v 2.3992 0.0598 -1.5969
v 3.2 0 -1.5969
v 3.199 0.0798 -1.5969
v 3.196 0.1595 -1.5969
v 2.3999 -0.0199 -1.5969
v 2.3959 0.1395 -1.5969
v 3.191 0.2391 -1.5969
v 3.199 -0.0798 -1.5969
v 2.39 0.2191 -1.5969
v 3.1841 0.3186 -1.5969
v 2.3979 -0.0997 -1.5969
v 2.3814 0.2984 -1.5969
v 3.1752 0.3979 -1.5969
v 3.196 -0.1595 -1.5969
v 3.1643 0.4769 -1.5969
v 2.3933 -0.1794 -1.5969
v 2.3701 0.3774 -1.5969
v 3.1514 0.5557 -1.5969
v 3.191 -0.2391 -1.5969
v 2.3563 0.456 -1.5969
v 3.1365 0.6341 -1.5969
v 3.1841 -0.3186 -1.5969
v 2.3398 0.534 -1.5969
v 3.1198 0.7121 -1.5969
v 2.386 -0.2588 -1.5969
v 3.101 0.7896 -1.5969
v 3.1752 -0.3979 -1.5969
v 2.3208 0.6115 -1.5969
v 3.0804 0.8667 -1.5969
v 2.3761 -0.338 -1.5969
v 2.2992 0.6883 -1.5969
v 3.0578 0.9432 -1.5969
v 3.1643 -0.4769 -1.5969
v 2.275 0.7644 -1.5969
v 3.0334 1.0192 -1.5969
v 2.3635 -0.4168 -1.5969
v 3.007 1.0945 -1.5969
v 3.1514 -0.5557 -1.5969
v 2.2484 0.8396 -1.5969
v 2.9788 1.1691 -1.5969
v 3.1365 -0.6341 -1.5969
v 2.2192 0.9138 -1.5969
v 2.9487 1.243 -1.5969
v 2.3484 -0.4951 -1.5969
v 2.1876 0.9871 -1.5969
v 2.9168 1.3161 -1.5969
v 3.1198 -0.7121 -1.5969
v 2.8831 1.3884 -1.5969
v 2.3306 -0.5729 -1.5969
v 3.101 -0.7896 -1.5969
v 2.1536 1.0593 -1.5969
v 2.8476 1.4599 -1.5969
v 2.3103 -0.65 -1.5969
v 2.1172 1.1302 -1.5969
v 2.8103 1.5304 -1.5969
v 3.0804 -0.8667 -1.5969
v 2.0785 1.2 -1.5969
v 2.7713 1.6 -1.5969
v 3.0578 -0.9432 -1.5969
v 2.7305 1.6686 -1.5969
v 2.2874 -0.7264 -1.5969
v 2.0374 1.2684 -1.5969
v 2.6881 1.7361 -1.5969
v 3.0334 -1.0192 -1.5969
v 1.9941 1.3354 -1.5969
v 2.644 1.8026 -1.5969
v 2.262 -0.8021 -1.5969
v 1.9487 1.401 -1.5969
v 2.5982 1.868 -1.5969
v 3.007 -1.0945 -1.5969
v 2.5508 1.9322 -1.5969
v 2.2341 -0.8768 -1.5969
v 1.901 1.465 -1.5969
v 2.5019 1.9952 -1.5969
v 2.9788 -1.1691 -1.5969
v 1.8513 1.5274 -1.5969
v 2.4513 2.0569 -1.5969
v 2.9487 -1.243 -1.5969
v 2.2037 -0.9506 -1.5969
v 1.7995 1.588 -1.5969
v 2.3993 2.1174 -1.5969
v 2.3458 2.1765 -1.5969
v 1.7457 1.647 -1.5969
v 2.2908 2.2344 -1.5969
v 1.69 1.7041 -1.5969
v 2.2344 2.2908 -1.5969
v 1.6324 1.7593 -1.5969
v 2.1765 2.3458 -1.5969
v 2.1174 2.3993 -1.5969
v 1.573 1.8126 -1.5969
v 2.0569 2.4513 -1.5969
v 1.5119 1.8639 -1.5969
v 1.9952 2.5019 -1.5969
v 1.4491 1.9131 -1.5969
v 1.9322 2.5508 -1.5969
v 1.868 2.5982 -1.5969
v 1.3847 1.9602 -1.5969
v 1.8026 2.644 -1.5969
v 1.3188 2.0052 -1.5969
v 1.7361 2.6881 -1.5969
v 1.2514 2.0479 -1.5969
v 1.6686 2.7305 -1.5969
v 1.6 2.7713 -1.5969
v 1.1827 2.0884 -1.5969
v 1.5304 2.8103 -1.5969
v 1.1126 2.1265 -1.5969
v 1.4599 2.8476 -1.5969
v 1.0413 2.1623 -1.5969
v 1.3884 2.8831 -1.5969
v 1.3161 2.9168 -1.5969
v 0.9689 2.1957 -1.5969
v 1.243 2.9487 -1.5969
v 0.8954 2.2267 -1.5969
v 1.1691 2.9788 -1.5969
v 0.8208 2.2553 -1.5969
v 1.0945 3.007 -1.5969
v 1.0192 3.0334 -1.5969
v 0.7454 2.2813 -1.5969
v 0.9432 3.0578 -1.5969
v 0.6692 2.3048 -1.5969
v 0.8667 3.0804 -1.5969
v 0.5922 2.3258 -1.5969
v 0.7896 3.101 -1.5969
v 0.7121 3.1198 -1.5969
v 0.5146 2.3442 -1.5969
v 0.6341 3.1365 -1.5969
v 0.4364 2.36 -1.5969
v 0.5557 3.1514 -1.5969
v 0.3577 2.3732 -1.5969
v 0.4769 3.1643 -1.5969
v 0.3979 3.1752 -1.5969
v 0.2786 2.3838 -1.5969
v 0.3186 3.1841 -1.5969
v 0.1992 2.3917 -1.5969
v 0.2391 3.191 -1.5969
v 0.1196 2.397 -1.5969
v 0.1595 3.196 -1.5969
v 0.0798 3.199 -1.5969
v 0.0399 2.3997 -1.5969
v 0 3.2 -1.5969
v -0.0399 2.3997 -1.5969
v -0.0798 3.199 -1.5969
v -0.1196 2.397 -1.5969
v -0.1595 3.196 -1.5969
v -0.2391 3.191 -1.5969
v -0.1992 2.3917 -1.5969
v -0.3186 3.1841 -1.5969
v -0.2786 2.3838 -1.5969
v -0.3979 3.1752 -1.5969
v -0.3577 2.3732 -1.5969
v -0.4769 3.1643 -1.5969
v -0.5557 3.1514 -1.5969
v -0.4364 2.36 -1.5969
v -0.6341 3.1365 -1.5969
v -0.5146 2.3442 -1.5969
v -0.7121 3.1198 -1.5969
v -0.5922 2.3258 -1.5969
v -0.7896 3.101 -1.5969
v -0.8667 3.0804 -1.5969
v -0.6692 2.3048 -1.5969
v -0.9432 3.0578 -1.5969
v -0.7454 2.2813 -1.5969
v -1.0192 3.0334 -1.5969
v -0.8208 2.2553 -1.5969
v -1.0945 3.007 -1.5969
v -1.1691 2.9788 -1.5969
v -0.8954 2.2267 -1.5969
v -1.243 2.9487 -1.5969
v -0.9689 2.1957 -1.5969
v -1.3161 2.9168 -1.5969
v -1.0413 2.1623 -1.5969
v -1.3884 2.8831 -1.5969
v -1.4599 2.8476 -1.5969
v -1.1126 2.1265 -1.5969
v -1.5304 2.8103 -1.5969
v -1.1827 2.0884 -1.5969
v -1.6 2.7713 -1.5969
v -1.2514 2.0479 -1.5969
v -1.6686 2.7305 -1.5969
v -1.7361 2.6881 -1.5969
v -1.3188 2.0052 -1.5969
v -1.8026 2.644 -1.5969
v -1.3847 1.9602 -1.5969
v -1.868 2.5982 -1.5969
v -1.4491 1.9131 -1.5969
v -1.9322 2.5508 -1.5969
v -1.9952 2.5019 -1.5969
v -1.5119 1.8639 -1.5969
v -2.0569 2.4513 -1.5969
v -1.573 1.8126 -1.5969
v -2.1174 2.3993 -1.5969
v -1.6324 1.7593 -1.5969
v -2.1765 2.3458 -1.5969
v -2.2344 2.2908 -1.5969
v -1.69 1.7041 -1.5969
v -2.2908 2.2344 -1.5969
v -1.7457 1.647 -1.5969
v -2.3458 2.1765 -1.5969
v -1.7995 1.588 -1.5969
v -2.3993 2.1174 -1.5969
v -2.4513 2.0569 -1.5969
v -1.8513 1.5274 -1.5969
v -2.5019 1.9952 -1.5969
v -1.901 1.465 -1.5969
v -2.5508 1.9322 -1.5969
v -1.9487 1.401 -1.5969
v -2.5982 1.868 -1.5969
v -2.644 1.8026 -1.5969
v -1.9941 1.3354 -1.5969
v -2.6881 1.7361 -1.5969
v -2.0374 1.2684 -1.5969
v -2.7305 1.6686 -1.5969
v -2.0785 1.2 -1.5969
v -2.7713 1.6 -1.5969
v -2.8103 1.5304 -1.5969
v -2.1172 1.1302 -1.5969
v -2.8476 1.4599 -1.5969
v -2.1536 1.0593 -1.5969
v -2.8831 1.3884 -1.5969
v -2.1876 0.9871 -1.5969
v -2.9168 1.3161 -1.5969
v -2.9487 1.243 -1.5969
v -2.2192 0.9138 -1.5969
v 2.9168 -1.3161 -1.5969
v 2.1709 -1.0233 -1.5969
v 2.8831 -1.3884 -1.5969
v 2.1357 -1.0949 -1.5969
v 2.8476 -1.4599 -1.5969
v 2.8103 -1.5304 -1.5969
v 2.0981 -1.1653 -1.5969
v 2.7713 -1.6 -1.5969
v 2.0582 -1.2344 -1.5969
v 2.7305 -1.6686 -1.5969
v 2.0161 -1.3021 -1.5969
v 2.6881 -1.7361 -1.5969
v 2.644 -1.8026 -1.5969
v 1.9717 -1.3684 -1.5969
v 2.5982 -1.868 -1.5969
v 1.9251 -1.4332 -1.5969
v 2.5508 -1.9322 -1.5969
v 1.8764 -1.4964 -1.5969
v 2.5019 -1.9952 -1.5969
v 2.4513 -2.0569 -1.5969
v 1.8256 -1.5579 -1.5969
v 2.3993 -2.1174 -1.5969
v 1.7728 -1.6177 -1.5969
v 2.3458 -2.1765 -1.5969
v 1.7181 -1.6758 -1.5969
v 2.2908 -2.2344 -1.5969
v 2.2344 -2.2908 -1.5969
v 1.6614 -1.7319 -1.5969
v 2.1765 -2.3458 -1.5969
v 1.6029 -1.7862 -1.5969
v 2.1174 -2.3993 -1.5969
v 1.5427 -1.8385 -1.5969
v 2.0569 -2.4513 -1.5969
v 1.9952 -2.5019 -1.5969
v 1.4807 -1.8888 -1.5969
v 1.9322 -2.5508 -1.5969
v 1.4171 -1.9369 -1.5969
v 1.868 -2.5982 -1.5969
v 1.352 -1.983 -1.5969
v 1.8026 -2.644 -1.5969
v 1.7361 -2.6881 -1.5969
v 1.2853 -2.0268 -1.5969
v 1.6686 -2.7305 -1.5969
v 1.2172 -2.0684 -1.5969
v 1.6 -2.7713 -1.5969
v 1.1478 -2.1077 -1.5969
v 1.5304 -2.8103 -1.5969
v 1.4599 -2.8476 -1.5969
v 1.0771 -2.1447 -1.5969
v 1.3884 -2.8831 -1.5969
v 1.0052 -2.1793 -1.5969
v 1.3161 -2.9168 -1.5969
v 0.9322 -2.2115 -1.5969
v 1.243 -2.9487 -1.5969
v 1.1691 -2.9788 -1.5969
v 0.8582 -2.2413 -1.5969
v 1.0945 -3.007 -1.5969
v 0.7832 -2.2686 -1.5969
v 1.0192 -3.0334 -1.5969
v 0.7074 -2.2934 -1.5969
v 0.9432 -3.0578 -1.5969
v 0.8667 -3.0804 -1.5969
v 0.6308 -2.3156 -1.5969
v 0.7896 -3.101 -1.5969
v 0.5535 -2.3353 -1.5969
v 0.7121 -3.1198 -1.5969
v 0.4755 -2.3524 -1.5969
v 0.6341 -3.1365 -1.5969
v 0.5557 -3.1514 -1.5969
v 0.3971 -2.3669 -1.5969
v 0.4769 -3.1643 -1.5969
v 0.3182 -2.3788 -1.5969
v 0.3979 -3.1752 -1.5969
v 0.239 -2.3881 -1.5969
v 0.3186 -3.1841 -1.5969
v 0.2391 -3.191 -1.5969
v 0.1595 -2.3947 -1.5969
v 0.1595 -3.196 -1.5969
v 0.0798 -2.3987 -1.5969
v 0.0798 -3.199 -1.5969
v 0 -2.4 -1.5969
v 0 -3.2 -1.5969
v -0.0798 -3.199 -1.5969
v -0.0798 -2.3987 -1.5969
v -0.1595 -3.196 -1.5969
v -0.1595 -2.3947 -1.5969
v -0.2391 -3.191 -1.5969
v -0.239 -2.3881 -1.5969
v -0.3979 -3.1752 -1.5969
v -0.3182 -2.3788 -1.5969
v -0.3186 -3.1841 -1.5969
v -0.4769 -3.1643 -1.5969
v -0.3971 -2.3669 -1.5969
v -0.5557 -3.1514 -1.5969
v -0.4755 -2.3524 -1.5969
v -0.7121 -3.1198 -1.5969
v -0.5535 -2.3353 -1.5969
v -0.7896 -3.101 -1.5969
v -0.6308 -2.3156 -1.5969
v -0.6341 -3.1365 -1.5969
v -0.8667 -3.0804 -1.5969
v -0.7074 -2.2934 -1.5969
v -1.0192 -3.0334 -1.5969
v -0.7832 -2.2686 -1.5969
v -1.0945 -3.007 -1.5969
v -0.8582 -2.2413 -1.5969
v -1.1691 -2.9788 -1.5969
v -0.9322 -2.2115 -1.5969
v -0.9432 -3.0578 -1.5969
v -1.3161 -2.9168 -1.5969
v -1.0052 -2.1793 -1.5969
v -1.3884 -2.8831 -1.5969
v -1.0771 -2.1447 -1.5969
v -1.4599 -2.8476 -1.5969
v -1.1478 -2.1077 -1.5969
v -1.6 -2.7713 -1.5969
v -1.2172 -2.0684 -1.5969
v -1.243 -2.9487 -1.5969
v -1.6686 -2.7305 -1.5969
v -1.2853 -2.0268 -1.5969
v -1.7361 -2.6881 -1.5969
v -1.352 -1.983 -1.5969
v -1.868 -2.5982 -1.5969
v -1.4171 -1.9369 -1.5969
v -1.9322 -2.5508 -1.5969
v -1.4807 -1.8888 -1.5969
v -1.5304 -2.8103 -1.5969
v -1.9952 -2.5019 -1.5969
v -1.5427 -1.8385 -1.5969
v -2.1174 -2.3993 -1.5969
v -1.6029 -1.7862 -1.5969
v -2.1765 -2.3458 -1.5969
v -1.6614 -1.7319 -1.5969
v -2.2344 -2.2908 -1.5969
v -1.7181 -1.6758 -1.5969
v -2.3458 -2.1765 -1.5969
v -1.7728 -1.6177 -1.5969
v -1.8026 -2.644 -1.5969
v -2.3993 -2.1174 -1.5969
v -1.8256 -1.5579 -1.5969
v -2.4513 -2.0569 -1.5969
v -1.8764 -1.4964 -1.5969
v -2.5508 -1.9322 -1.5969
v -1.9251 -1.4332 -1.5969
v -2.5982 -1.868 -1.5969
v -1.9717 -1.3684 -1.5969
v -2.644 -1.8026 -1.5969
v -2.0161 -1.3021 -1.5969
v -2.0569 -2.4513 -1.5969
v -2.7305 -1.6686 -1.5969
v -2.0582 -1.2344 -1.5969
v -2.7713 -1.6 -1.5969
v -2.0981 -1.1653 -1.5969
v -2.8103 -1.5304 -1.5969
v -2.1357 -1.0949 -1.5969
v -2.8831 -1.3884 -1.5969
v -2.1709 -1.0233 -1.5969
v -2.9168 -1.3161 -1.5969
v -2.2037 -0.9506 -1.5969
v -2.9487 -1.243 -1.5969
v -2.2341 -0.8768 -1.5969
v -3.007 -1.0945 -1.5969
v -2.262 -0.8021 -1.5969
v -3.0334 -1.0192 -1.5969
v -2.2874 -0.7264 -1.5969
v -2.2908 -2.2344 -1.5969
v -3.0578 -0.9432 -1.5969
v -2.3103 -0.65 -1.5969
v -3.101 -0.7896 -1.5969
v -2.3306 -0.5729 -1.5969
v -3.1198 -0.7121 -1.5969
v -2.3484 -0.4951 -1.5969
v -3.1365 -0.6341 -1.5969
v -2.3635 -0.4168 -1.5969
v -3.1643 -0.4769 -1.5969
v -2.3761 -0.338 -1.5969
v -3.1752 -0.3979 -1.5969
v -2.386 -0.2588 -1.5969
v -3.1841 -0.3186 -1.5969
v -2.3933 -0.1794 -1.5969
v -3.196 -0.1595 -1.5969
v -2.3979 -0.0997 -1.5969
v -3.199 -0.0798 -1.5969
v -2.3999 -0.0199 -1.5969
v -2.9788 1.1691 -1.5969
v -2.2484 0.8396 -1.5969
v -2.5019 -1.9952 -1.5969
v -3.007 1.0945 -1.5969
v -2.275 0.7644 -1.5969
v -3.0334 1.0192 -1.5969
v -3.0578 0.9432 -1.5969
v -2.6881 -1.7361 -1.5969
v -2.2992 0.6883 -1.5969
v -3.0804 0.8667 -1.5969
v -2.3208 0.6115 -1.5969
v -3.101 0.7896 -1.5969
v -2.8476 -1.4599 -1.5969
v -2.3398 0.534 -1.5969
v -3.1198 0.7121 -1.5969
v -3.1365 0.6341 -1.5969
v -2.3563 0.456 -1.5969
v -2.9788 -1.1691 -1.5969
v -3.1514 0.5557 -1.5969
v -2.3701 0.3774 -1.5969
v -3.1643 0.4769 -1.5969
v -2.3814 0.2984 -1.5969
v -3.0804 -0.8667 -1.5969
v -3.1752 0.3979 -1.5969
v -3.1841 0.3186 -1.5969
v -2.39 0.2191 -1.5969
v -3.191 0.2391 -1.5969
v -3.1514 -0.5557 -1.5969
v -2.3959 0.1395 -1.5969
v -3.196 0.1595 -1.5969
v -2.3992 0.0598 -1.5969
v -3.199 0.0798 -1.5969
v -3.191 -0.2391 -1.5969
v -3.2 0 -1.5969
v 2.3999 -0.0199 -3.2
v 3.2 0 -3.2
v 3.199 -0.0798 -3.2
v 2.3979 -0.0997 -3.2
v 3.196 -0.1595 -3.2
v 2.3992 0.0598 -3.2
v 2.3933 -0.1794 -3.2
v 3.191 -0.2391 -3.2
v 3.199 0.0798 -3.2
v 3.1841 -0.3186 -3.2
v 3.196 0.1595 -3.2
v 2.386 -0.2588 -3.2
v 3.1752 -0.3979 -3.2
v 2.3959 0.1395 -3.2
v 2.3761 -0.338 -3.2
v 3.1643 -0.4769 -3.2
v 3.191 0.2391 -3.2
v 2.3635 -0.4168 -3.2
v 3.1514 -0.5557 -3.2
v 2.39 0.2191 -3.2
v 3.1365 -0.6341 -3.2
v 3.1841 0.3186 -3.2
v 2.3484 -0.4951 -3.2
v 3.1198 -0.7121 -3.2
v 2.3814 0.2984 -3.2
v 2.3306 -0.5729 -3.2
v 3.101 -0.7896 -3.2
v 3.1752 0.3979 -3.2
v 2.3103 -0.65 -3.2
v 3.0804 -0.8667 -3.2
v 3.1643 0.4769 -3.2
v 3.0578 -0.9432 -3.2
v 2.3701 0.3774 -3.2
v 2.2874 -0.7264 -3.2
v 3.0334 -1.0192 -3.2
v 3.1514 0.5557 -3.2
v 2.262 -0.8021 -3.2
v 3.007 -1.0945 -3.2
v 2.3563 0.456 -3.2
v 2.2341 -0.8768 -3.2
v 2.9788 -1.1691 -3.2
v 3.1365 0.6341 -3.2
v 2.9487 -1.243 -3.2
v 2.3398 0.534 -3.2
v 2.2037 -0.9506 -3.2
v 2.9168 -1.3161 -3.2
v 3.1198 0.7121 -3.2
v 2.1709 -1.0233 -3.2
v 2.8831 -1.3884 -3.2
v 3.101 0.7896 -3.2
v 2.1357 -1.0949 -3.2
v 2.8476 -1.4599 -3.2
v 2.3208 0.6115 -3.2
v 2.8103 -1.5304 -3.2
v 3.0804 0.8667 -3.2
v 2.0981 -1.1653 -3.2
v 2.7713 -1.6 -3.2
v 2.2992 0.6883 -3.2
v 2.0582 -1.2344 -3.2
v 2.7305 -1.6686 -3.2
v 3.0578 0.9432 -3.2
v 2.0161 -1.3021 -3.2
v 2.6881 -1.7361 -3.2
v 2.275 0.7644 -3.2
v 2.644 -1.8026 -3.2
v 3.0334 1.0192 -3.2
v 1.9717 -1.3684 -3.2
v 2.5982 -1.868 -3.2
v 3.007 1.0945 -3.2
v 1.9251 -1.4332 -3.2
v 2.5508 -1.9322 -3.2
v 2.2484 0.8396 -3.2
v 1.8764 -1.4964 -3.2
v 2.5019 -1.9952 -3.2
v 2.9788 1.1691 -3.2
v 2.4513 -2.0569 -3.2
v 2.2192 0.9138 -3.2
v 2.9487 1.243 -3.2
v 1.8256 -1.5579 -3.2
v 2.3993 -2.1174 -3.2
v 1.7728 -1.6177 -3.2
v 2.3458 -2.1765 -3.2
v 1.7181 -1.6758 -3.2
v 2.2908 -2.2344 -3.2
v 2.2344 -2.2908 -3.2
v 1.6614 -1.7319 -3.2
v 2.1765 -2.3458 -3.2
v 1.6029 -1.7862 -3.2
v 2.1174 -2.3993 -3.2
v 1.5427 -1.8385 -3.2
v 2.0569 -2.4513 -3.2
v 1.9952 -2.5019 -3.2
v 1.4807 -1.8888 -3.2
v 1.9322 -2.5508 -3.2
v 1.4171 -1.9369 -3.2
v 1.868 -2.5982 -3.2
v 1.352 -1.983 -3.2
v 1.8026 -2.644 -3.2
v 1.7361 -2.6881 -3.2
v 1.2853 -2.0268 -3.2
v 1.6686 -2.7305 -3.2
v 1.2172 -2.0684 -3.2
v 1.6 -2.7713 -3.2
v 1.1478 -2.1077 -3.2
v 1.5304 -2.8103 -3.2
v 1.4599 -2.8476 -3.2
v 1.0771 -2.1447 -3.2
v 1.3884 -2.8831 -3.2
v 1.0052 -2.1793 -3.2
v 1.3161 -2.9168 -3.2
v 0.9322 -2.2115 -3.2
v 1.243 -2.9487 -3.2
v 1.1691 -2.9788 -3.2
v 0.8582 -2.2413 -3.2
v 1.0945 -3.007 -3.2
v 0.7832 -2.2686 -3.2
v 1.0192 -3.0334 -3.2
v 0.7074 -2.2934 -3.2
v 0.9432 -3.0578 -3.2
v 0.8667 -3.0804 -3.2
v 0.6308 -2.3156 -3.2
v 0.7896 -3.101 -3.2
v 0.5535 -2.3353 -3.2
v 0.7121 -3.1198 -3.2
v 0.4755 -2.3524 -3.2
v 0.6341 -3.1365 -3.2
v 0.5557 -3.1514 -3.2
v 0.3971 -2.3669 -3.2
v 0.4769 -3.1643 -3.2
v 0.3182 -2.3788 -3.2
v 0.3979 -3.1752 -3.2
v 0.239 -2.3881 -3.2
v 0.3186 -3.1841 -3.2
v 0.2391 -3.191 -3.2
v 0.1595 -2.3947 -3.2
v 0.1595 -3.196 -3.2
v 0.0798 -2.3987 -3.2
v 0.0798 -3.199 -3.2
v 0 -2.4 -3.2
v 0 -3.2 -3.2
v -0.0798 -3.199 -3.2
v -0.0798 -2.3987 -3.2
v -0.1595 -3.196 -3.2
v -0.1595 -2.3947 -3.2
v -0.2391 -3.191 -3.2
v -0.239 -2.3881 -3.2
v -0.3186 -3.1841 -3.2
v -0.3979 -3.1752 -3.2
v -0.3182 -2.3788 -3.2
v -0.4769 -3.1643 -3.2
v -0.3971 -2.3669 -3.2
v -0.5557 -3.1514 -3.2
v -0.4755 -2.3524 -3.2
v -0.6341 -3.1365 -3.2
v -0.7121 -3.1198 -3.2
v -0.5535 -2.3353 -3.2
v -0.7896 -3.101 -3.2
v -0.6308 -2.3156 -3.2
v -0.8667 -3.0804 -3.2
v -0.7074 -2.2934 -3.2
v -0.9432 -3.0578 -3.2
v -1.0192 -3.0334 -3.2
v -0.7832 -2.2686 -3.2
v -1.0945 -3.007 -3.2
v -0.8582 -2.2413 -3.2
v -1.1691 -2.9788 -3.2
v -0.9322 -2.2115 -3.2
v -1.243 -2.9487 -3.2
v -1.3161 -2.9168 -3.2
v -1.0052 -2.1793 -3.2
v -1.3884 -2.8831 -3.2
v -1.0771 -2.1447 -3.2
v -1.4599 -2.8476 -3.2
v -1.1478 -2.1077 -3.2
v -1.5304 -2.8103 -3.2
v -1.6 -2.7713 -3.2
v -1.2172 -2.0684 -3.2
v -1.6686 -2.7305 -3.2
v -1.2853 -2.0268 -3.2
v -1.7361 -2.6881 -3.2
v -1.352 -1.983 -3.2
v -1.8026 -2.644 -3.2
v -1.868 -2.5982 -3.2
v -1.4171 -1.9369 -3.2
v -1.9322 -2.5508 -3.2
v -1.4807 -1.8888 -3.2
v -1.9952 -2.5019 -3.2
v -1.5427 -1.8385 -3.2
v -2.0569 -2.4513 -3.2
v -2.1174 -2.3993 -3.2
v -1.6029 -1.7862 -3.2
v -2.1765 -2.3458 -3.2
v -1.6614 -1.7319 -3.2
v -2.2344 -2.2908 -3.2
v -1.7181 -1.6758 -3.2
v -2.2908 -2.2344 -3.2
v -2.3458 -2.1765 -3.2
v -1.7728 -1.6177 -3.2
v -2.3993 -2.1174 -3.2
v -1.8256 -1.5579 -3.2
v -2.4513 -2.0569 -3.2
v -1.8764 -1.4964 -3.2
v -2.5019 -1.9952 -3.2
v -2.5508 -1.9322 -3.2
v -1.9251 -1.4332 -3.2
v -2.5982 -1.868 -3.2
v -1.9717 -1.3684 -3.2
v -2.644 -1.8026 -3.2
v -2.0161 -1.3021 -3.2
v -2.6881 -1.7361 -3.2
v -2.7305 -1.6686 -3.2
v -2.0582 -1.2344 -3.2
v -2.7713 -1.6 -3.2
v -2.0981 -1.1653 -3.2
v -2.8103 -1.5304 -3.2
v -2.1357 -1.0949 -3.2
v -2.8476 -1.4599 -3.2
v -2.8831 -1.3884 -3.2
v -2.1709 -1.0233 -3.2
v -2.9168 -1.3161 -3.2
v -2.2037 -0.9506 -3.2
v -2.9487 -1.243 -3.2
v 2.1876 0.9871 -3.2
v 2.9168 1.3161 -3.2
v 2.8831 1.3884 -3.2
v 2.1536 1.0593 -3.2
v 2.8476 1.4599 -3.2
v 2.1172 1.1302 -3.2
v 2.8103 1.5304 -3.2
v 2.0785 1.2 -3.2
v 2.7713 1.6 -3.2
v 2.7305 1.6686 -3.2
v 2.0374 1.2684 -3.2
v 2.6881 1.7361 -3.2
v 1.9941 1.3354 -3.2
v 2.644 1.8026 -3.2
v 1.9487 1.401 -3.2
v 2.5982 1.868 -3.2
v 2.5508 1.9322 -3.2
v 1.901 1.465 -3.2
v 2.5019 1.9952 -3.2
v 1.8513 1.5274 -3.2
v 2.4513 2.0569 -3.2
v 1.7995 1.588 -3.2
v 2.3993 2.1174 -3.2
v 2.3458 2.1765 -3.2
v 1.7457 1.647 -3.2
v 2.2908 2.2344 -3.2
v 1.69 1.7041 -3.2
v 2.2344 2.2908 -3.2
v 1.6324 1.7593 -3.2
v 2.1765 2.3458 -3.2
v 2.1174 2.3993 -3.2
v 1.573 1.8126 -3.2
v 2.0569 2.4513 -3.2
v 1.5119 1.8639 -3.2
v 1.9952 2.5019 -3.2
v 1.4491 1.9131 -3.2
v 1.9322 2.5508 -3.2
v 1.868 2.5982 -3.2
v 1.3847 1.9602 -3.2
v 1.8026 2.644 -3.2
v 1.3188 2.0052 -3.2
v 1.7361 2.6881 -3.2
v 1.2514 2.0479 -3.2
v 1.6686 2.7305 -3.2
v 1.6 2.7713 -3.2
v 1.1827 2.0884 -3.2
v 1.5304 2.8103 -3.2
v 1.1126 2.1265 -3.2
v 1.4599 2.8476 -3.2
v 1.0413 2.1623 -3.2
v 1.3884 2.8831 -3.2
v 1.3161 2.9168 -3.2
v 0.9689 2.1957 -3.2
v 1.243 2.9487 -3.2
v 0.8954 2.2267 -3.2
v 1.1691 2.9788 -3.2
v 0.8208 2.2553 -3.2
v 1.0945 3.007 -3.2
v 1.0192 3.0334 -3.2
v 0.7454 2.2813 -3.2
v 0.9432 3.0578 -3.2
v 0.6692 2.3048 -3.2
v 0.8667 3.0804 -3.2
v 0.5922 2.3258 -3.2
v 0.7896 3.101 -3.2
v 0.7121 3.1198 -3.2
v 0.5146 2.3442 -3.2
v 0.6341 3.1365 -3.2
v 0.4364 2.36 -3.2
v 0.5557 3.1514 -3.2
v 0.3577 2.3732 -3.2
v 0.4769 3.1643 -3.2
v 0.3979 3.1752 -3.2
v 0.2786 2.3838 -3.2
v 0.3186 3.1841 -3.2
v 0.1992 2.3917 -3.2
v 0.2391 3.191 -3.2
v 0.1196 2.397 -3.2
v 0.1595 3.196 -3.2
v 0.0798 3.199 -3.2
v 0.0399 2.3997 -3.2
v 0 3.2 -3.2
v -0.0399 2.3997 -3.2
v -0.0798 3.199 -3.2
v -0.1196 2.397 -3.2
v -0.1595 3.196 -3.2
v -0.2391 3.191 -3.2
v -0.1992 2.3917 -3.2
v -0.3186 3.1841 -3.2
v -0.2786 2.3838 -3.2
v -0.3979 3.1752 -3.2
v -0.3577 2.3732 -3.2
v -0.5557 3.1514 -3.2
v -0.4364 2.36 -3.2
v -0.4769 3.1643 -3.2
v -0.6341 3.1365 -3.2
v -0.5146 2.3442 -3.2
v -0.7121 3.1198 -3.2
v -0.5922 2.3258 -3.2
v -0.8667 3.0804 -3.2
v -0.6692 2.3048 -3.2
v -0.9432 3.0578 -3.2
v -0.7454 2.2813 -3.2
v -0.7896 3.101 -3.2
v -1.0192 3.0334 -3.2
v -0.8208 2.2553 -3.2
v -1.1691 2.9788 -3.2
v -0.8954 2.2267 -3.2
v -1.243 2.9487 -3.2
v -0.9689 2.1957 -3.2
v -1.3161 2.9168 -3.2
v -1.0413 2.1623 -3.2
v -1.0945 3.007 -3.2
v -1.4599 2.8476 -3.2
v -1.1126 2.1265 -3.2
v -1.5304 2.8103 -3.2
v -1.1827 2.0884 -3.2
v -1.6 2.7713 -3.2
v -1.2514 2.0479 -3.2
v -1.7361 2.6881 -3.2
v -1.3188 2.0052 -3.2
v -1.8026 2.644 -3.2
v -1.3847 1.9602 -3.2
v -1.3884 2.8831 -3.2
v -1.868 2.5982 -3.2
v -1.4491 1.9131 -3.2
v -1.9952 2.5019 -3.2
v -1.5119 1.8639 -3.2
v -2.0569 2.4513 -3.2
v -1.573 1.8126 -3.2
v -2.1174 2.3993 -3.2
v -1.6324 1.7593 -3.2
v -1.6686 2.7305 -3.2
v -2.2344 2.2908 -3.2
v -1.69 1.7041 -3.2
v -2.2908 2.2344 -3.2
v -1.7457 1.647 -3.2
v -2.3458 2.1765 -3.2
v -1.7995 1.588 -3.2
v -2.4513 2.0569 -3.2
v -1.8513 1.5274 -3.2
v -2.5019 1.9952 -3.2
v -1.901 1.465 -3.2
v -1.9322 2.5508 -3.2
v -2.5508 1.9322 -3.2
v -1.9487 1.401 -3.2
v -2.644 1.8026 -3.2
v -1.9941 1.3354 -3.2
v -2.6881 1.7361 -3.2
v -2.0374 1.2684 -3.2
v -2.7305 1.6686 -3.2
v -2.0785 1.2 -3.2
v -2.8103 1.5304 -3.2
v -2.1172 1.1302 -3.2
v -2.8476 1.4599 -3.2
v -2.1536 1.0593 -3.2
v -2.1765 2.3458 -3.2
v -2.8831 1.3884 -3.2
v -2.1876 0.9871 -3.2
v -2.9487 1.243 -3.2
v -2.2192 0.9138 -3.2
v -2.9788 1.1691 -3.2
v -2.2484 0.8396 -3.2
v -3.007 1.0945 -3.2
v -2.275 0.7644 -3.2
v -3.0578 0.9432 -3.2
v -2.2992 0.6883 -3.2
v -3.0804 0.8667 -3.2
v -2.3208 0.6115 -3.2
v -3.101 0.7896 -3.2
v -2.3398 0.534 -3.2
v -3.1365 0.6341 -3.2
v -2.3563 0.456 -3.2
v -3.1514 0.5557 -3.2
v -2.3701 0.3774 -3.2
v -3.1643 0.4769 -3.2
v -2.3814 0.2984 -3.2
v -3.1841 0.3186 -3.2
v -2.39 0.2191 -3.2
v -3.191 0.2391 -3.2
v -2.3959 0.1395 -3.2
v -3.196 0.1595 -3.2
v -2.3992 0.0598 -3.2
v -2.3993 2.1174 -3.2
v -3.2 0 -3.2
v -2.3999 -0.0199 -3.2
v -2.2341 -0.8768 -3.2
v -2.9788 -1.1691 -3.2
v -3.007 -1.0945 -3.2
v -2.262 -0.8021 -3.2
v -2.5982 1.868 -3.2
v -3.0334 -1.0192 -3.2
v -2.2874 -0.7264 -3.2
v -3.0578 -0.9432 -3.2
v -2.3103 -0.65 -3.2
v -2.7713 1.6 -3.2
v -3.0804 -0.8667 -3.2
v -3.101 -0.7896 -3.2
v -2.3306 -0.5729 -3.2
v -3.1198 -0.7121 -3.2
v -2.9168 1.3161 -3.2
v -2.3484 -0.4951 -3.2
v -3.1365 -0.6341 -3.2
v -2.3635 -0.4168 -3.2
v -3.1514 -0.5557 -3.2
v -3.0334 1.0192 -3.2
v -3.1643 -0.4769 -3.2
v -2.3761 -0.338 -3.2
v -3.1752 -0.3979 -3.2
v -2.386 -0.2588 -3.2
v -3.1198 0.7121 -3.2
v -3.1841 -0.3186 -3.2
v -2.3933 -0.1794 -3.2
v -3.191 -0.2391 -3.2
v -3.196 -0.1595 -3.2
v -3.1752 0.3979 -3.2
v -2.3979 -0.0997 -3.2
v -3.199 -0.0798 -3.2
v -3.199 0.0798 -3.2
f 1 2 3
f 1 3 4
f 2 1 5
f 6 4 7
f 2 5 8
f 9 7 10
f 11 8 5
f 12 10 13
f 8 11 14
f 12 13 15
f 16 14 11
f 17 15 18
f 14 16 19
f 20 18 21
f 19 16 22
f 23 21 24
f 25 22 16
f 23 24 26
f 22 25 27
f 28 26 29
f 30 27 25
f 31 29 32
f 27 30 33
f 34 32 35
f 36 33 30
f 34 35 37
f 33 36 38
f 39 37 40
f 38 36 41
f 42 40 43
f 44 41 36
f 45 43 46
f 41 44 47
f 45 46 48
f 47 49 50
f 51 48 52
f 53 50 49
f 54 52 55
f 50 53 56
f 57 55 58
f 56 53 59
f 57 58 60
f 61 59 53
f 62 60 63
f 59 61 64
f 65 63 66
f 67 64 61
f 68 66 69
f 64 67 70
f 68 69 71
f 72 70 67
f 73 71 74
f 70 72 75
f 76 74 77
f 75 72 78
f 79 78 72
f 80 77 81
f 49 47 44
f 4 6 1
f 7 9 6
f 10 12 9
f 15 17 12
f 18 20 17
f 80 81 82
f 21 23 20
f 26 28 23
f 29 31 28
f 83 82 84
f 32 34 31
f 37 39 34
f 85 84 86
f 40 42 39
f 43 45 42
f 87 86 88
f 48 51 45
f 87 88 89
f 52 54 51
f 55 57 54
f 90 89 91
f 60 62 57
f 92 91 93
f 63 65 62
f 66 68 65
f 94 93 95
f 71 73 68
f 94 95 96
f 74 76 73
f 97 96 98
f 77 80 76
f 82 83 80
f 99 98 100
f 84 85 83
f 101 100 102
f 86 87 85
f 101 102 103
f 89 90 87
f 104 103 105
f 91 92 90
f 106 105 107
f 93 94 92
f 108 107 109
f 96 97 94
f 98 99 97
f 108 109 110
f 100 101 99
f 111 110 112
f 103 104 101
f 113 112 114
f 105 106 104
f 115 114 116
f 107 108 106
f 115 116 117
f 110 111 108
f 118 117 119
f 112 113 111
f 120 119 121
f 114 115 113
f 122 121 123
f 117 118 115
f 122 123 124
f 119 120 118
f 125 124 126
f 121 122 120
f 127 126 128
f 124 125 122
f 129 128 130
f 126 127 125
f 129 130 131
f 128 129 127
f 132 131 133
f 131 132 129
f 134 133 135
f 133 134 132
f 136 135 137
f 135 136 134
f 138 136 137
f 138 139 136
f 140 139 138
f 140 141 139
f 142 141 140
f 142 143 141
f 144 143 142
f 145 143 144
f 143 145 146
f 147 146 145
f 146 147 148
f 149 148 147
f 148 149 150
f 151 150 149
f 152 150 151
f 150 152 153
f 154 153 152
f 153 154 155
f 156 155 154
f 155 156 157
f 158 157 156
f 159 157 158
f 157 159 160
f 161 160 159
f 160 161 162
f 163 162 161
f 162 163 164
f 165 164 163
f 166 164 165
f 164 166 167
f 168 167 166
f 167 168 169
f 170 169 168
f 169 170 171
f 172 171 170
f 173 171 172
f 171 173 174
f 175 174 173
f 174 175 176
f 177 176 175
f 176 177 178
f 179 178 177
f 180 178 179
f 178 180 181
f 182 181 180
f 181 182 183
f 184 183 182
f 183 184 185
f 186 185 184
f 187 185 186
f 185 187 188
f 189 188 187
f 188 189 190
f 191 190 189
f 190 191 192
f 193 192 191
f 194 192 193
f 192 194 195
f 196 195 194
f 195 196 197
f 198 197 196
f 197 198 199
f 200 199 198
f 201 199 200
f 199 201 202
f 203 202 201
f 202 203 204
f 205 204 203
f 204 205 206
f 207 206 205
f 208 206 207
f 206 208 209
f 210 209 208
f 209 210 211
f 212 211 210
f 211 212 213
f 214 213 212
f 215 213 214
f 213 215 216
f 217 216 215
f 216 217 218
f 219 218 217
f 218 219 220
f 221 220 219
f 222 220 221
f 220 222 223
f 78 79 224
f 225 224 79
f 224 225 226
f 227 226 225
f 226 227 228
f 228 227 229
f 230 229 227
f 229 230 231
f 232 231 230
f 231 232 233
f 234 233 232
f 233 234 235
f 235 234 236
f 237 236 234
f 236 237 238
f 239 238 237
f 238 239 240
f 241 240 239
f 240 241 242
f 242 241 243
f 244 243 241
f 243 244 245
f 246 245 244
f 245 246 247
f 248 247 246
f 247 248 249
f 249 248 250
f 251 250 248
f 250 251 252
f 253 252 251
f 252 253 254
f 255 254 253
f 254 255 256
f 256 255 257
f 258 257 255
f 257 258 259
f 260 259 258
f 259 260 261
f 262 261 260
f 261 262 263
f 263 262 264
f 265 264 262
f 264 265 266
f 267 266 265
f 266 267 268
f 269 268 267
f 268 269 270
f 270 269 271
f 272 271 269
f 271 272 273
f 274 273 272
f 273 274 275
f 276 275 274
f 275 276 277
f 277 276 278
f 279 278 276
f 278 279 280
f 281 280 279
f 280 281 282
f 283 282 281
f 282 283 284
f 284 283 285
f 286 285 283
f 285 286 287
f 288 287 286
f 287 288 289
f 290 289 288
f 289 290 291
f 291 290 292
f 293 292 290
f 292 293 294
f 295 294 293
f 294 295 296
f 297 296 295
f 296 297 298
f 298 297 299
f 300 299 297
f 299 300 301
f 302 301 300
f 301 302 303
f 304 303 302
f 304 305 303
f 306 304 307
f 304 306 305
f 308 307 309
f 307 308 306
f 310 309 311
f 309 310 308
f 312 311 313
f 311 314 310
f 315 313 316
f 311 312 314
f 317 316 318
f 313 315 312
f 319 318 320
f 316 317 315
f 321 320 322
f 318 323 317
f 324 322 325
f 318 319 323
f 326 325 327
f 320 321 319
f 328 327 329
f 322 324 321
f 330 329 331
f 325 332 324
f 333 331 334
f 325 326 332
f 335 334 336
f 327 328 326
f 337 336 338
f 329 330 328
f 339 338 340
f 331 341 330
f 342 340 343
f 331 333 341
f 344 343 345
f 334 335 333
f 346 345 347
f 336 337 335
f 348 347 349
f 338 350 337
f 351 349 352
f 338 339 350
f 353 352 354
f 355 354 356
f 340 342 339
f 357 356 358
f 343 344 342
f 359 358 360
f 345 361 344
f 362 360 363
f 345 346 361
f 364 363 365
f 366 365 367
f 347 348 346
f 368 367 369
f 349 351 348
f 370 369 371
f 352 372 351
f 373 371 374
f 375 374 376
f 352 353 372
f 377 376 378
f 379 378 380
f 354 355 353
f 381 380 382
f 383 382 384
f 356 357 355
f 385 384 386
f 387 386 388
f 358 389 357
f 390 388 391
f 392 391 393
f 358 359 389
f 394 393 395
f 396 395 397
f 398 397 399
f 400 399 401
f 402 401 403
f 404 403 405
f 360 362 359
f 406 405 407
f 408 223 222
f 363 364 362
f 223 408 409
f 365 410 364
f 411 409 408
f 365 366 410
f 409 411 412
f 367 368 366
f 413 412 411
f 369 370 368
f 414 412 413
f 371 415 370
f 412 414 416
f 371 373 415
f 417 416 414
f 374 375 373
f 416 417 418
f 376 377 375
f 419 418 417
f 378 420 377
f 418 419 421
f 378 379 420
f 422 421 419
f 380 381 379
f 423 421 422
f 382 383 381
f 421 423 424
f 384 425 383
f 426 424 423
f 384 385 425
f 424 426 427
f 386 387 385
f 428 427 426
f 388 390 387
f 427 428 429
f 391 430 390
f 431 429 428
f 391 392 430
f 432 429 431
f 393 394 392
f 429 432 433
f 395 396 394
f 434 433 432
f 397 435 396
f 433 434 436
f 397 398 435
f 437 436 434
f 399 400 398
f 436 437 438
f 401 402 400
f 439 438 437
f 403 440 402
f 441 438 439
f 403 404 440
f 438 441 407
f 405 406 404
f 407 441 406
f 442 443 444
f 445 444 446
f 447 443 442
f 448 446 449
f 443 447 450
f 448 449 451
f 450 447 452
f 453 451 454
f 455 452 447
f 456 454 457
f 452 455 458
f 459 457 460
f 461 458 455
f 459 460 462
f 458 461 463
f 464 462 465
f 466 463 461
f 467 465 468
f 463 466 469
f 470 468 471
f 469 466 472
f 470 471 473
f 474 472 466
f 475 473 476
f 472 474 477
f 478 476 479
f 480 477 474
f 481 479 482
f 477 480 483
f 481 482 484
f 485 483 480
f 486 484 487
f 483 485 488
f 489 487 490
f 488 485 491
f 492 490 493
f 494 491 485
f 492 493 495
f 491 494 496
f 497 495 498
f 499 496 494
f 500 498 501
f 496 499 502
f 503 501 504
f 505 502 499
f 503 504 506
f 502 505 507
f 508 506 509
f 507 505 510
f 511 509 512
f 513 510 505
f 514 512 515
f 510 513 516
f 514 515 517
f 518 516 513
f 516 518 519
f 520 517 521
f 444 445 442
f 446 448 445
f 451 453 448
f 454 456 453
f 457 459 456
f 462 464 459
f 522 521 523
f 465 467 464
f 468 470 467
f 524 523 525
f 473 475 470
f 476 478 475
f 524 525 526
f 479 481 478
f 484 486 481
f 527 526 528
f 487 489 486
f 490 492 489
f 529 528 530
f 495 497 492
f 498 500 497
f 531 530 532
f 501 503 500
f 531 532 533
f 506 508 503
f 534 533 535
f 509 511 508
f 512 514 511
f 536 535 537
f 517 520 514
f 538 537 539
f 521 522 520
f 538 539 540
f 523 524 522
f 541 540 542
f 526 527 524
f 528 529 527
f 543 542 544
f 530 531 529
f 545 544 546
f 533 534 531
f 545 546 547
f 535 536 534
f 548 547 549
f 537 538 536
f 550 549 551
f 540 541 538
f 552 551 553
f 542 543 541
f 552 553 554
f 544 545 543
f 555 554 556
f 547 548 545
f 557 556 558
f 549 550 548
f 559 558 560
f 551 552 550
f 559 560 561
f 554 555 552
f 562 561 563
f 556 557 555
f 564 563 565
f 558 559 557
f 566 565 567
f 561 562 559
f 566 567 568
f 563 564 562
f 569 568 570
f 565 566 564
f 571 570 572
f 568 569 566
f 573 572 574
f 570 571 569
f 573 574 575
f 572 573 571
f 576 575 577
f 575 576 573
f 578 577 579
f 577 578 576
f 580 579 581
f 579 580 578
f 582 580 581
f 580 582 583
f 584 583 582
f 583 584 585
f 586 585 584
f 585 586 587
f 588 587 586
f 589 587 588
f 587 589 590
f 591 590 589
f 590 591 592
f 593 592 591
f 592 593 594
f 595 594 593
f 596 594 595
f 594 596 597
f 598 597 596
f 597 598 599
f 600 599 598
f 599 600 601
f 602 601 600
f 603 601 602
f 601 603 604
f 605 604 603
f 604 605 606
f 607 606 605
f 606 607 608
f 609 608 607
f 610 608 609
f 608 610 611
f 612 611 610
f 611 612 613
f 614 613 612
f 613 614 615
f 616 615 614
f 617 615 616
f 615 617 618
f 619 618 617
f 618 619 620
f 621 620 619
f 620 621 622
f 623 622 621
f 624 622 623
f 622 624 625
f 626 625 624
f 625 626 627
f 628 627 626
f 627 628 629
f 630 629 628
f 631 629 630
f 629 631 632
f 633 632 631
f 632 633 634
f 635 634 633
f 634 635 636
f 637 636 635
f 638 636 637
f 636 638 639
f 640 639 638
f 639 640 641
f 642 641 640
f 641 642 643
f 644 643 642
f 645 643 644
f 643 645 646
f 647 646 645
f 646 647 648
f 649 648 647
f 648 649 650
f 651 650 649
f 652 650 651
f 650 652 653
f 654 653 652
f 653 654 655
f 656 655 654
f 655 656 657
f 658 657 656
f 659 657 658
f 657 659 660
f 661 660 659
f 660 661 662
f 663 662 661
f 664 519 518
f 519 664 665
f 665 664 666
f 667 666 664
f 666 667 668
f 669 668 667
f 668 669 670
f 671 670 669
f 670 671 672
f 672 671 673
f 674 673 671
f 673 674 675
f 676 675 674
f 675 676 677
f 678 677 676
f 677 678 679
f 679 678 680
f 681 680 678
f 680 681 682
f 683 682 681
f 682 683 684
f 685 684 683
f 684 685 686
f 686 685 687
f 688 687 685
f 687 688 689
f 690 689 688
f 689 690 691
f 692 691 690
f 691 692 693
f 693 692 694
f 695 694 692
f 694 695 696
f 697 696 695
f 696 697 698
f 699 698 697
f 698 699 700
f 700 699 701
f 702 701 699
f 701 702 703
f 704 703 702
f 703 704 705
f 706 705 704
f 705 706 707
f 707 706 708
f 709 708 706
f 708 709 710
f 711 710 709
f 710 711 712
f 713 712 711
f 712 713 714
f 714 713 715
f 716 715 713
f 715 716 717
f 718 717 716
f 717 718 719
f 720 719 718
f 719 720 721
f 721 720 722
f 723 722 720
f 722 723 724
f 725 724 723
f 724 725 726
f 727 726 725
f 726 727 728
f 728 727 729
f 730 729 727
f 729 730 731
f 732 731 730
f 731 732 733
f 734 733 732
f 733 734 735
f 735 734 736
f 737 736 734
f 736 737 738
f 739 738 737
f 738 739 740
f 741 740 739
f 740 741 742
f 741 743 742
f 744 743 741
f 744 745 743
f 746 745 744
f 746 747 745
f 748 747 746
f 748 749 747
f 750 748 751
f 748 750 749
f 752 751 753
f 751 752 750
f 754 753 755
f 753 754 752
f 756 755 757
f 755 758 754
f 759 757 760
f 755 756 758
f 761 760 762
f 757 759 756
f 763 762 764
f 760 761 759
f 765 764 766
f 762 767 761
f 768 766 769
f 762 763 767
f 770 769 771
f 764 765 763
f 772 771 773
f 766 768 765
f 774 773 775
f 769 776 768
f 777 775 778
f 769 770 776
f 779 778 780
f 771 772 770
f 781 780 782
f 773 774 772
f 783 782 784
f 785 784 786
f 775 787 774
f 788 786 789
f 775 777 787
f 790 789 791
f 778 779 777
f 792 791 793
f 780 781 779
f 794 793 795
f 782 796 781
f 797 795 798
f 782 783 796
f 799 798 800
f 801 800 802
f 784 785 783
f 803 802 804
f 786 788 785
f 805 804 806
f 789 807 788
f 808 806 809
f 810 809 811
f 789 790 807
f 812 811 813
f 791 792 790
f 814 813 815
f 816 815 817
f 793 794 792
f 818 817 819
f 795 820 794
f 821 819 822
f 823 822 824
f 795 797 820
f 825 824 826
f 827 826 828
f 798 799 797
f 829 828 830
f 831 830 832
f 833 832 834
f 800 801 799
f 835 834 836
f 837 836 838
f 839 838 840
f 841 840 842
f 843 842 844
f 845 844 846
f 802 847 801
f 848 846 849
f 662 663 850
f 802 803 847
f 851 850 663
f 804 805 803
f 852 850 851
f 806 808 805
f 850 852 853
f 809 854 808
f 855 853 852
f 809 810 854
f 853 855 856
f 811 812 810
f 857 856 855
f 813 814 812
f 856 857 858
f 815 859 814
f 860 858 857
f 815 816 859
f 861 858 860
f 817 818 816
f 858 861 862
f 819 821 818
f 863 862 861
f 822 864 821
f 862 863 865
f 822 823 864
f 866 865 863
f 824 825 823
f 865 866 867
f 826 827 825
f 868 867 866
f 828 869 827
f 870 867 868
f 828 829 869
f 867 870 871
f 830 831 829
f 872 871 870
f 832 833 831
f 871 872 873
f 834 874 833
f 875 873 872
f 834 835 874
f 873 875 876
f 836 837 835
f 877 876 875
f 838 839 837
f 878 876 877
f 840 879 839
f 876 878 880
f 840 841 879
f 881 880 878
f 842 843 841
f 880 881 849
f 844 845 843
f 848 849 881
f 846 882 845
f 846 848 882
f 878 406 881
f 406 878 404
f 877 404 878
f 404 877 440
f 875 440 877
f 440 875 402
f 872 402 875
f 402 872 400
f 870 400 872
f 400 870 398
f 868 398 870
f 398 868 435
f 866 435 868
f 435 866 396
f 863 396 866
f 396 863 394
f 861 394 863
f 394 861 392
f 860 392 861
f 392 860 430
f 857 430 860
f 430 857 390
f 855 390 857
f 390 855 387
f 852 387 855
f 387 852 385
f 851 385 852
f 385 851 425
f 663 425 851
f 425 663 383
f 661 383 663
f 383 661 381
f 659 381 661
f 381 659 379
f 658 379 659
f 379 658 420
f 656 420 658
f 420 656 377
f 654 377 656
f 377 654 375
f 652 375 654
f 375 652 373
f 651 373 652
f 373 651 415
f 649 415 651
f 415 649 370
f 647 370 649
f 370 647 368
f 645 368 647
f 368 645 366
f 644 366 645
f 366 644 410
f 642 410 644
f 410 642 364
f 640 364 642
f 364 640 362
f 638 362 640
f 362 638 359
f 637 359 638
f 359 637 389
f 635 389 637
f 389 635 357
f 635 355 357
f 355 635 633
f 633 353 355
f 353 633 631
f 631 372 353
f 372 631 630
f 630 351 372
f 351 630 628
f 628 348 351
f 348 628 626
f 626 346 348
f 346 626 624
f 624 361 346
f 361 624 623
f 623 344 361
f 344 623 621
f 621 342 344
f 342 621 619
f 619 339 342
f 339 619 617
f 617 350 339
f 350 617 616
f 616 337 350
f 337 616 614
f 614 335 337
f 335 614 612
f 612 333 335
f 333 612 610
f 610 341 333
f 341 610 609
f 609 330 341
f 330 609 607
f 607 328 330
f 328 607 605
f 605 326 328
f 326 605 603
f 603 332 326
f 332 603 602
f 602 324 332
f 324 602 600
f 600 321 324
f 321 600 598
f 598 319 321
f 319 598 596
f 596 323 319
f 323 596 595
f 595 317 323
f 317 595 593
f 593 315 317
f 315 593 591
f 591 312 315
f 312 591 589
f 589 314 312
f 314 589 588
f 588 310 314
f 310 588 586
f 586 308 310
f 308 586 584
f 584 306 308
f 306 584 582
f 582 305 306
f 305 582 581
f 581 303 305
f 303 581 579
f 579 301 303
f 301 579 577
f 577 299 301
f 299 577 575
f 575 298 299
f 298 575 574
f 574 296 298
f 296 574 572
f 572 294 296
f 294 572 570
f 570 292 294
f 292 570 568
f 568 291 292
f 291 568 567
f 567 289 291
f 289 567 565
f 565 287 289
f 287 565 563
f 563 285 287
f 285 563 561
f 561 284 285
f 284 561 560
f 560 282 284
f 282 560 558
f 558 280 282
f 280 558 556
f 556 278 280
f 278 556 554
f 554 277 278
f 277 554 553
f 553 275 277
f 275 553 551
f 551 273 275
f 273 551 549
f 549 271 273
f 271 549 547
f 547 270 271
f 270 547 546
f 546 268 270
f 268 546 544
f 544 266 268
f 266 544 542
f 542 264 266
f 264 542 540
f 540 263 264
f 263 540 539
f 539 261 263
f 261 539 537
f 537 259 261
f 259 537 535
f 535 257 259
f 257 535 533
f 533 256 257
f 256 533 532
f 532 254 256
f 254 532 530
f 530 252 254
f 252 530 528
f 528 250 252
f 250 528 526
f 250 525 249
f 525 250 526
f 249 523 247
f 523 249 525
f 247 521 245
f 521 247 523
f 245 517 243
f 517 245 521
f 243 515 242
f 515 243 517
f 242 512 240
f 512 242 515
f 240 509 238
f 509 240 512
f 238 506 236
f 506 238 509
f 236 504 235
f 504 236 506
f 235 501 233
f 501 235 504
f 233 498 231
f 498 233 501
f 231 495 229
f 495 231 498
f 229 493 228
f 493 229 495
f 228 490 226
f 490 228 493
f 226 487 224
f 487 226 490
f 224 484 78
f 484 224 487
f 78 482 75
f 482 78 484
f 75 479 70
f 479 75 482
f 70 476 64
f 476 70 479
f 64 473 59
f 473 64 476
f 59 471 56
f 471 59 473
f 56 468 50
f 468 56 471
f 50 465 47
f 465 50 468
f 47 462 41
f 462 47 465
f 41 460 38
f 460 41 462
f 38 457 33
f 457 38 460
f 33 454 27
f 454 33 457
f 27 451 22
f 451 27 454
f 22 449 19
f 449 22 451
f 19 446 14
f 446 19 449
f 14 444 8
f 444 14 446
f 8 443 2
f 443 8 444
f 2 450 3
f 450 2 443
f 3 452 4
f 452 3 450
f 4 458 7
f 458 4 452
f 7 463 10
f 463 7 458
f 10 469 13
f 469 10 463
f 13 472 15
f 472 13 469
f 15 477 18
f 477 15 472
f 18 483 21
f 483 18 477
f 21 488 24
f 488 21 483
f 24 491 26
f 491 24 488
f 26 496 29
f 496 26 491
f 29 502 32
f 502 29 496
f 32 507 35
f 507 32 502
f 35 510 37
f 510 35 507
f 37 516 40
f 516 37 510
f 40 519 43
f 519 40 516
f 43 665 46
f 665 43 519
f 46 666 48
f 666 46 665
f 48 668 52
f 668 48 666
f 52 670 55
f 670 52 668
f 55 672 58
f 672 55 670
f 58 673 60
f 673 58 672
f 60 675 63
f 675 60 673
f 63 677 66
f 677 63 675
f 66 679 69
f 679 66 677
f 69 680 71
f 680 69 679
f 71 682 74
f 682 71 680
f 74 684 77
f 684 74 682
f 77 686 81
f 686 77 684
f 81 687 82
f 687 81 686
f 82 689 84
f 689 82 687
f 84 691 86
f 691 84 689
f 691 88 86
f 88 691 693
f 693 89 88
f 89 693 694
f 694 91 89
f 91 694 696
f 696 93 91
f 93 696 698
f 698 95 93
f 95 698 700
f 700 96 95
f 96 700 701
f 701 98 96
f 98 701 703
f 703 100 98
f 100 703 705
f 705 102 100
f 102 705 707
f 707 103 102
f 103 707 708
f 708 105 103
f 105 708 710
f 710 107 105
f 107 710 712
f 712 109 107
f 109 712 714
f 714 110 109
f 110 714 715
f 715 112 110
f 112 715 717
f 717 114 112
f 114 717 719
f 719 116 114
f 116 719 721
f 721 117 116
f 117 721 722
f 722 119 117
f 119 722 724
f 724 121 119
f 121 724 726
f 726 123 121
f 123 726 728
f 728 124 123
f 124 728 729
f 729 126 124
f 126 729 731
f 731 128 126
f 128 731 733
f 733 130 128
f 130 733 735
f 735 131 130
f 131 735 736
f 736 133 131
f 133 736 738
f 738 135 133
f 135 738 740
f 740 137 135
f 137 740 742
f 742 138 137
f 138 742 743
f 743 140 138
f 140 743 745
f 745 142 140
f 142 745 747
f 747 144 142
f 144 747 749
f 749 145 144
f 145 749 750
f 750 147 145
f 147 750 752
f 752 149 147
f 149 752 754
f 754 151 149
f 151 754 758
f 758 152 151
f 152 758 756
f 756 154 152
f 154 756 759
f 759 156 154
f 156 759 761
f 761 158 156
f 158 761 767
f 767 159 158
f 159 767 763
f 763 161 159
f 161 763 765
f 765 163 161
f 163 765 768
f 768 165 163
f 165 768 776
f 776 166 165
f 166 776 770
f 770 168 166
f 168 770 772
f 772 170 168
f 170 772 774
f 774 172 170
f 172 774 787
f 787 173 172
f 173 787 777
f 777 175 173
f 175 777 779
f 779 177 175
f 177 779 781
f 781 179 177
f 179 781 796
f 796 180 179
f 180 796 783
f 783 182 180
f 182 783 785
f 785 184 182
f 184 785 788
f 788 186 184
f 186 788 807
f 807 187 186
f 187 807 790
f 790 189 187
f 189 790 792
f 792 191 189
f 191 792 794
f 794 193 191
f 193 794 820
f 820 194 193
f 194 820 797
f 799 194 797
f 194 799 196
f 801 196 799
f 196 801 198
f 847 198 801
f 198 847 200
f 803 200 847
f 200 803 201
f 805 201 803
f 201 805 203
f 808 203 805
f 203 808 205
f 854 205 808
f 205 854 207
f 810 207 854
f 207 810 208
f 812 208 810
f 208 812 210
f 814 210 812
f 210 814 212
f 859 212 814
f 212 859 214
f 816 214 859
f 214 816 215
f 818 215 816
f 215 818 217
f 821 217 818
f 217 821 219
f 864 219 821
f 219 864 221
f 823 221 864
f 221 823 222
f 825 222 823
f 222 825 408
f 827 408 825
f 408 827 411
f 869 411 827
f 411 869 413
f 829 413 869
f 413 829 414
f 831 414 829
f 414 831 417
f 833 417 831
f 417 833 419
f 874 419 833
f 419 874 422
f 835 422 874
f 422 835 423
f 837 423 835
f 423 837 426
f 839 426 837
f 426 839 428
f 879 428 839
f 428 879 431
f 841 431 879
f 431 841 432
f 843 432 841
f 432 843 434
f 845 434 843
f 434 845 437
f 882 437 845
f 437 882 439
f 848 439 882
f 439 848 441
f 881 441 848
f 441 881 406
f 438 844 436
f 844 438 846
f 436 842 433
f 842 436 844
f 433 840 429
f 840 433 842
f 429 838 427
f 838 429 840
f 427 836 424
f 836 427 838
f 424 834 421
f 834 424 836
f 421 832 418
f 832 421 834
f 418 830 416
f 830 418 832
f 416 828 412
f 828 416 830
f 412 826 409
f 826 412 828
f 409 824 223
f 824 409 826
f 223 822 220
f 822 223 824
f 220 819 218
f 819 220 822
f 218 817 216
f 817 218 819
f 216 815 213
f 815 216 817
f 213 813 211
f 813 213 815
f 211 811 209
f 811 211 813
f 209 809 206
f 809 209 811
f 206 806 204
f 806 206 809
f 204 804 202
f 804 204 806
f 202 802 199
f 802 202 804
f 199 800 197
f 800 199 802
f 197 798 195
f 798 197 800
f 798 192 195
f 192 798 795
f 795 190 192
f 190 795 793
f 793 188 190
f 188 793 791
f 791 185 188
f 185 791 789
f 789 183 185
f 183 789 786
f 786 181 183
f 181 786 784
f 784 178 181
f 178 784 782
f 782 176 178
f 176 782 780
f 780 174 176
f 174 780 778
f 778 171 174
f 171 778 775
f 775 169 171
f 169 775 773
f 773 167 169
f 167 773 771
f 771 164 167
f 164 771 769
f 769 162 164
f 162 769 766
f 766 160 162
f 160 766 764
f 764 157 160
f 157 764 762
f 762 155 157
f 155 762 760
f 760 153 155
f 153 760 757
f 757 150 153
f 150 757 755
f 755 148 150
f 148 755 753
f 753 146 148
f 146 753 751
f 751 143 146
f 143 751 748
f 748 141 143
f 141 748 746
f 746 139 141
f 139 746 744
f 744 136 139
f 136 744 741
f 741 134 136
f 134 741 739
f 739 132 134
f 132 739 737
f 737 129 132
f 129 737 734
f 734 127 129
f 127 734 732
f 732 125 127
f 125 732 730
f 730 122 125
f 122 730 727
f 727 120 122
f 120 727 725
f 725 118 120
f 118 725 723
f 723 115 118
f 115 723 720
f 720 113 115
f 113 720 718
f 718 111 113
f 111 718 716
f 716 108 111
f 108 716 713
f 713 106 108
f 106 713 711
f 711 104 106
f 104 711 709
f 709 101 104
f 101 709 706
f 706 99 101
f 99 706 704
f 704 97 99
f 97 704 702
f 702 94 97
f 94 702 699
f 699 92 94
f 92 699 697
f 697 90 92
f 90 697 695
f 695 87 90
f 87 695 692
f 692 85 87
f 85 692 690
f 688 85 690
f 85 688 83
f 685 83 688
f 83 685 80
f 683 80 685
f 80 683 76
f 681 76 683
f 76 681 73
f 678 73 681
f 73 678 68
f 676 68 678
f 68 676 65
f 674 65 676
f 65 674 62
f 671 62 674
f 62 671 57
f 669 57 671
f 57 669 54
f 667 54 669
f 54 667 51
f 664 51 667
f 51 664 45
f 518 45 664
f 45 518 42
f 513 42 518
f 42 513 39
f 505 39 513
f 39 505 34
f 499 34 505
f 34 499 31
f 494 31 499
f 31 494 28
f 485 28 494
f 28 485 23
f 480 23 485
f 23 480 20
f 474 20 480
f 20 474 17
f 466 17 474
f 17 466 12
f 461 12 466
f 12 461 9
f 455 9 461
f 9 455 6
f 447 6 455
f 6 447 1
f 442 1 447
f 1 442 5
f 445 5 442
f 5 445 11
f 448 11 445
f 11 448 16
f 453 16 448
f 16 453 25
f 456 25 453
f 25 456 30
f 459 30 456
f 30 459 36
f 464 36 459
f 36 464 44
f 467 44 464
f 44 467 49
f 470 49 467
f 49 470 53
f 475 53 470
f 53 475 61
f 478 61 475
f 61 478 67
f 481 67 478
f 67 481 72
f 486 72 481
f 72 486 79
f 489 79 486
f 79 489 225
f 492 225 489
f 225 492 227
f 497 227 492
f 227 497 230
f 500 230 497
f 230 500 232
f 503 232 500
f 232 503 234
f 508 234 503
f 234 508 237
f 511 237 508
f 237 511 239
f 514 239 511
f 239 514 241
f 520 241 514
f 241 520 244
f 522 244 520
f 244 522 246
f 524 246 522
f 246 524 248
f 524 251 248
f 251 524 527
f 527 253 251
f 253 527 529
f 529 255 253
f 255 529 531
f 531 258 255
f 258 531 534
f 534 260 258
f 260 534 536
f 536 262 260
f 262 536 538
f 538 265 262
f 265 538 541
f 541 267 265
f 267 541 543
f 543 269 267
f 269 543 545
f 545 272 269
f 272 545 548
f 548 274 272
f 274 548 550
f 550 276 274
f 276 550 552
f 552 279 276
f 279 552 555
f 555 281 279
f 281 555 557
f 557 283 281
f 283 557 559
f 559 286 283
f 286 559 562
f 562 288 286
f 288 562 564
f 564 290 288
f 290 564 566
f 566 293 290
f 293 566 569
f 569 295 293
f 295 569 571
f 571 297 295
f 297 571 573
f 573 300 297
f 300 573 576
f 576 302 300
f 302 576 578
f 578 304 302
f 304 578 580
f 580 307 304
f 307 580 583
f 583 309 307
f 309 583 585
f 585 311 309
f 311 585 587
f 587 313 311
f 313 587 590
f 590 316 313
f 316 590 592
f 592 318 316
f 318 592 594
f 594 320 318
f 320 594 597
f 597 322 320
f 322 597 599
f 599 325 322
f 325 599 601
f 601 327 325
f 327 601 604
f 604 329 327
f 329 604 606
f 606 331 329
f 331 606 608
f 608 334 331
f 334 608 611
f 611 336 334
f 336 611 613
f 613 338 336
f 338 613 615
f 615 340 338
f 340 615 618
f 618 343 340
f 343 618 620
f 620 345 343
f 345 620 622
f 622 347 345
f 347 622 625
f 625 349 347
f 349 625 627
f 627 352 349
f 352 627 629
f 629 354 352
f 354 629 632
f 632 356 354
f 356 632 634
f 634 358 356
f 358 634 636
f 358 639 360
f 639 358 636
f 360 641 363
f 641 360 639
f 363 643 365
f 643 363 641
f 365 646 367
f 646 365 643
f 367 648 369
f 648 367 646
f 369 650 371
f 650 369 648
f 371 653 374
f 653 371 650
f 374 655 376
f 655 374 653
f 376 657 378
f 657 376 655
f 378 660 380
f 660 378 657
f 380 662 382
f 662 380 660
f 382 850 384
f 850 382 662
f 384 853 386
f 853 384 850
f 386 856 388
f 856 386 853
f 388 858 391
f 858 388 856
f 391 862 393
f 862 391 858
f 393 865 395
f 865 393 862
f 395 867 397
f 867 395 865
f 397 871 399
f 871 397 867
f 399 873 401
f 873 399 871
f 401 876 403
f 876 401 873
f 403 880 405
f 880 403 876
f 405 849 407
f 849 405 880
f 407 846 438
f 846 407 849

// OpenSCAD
use <../lib.scad>
use <s/3068bpf0s01.scad>
use <s/3068bpf0s02.scad>
use <s/3068bpf0s03.scad>
use <s/3068bs01.scad>
$fa=1; $fs=0.2;
function ldraw_lib__3068bpf0(realsolid=false) = [
// 0 Tile  2 x  2 with  4 Red and Yellow Flowers on LtGreen/Green Leaves Pattern
// 0 Name: 3068bpf0.dat
// 0 Author: Steffen [Steffen]
// 0 !LDRAW_ORG Part UPDATE 2020-01
// 0 !LICENSE Licensed under CC BY 2.0 and CC BY 4.0 : see CAreadme.txt
// 
// 0 !HELP scala sets 311 and 312 seem to have been packaged in 2 variants:
// 0 !HELP some contain 3068bpf0.dat
// 0 !HELP some contain 3068bpfz.dat
// 
// 0 BFC CERTIFY CCW
  [0,"BFC","CERTIFY"],
  [0,"BFC","CCW"],
// 
// 0 !KEYWORDS Scala, set 311, set 312
// 
// 0 !CMDLINE -c15
// 
// 0 !HISTORY 2020-06-28 [PTadmin] Official Update 2020-01
// 
// 
// 1 16 0 0 0 1 0 0 0 1 0 0 0 1 s\3068bs01.dat
  [1,16,0,0,0,1,0,0,0,1,0,0,0,1, ldraw_lib__s__3068bs01(realsolid)],
// 1 16 0 0 0 1 0 0 0 1 0 0 0 1 s\3068bpf0s01.dat
  [1,16,0,0,0,1,0,0,0,1,0,0,0,1, ldraw_lib__s__3068bpf0s01(realsolid)],
// 1 4 0 0 0 1 0 0 0 1 0 0 0 1 s\3068bpf0s02.dat
  [1,4,0,0,0,1,0,0,0,1,0,0,0,1, ldraw_lib__s__3068bpf0s02(realsolid)],
// 1 14 0 0 0 1 0 0 0 1 0 0 0 1 s\3068bpf0s03.dat
  [1,14,0,0,0,1,0,0,0,1,0,0,0,1, ldraw_lib__s__3068bpf0s03(realsolid)],
];
module ldraw_lib__3068bpf0(step=0, col=false, unit=2/5, alt=false, line=0.2, solid=!$preview)
    makepoly(ldraw_lib__3068bpf0(solid), step=step, col=col, unit=unit, alt=alt, line=line, solid=solid);
ldraw_lib__3068bpf0(line=0.2);
